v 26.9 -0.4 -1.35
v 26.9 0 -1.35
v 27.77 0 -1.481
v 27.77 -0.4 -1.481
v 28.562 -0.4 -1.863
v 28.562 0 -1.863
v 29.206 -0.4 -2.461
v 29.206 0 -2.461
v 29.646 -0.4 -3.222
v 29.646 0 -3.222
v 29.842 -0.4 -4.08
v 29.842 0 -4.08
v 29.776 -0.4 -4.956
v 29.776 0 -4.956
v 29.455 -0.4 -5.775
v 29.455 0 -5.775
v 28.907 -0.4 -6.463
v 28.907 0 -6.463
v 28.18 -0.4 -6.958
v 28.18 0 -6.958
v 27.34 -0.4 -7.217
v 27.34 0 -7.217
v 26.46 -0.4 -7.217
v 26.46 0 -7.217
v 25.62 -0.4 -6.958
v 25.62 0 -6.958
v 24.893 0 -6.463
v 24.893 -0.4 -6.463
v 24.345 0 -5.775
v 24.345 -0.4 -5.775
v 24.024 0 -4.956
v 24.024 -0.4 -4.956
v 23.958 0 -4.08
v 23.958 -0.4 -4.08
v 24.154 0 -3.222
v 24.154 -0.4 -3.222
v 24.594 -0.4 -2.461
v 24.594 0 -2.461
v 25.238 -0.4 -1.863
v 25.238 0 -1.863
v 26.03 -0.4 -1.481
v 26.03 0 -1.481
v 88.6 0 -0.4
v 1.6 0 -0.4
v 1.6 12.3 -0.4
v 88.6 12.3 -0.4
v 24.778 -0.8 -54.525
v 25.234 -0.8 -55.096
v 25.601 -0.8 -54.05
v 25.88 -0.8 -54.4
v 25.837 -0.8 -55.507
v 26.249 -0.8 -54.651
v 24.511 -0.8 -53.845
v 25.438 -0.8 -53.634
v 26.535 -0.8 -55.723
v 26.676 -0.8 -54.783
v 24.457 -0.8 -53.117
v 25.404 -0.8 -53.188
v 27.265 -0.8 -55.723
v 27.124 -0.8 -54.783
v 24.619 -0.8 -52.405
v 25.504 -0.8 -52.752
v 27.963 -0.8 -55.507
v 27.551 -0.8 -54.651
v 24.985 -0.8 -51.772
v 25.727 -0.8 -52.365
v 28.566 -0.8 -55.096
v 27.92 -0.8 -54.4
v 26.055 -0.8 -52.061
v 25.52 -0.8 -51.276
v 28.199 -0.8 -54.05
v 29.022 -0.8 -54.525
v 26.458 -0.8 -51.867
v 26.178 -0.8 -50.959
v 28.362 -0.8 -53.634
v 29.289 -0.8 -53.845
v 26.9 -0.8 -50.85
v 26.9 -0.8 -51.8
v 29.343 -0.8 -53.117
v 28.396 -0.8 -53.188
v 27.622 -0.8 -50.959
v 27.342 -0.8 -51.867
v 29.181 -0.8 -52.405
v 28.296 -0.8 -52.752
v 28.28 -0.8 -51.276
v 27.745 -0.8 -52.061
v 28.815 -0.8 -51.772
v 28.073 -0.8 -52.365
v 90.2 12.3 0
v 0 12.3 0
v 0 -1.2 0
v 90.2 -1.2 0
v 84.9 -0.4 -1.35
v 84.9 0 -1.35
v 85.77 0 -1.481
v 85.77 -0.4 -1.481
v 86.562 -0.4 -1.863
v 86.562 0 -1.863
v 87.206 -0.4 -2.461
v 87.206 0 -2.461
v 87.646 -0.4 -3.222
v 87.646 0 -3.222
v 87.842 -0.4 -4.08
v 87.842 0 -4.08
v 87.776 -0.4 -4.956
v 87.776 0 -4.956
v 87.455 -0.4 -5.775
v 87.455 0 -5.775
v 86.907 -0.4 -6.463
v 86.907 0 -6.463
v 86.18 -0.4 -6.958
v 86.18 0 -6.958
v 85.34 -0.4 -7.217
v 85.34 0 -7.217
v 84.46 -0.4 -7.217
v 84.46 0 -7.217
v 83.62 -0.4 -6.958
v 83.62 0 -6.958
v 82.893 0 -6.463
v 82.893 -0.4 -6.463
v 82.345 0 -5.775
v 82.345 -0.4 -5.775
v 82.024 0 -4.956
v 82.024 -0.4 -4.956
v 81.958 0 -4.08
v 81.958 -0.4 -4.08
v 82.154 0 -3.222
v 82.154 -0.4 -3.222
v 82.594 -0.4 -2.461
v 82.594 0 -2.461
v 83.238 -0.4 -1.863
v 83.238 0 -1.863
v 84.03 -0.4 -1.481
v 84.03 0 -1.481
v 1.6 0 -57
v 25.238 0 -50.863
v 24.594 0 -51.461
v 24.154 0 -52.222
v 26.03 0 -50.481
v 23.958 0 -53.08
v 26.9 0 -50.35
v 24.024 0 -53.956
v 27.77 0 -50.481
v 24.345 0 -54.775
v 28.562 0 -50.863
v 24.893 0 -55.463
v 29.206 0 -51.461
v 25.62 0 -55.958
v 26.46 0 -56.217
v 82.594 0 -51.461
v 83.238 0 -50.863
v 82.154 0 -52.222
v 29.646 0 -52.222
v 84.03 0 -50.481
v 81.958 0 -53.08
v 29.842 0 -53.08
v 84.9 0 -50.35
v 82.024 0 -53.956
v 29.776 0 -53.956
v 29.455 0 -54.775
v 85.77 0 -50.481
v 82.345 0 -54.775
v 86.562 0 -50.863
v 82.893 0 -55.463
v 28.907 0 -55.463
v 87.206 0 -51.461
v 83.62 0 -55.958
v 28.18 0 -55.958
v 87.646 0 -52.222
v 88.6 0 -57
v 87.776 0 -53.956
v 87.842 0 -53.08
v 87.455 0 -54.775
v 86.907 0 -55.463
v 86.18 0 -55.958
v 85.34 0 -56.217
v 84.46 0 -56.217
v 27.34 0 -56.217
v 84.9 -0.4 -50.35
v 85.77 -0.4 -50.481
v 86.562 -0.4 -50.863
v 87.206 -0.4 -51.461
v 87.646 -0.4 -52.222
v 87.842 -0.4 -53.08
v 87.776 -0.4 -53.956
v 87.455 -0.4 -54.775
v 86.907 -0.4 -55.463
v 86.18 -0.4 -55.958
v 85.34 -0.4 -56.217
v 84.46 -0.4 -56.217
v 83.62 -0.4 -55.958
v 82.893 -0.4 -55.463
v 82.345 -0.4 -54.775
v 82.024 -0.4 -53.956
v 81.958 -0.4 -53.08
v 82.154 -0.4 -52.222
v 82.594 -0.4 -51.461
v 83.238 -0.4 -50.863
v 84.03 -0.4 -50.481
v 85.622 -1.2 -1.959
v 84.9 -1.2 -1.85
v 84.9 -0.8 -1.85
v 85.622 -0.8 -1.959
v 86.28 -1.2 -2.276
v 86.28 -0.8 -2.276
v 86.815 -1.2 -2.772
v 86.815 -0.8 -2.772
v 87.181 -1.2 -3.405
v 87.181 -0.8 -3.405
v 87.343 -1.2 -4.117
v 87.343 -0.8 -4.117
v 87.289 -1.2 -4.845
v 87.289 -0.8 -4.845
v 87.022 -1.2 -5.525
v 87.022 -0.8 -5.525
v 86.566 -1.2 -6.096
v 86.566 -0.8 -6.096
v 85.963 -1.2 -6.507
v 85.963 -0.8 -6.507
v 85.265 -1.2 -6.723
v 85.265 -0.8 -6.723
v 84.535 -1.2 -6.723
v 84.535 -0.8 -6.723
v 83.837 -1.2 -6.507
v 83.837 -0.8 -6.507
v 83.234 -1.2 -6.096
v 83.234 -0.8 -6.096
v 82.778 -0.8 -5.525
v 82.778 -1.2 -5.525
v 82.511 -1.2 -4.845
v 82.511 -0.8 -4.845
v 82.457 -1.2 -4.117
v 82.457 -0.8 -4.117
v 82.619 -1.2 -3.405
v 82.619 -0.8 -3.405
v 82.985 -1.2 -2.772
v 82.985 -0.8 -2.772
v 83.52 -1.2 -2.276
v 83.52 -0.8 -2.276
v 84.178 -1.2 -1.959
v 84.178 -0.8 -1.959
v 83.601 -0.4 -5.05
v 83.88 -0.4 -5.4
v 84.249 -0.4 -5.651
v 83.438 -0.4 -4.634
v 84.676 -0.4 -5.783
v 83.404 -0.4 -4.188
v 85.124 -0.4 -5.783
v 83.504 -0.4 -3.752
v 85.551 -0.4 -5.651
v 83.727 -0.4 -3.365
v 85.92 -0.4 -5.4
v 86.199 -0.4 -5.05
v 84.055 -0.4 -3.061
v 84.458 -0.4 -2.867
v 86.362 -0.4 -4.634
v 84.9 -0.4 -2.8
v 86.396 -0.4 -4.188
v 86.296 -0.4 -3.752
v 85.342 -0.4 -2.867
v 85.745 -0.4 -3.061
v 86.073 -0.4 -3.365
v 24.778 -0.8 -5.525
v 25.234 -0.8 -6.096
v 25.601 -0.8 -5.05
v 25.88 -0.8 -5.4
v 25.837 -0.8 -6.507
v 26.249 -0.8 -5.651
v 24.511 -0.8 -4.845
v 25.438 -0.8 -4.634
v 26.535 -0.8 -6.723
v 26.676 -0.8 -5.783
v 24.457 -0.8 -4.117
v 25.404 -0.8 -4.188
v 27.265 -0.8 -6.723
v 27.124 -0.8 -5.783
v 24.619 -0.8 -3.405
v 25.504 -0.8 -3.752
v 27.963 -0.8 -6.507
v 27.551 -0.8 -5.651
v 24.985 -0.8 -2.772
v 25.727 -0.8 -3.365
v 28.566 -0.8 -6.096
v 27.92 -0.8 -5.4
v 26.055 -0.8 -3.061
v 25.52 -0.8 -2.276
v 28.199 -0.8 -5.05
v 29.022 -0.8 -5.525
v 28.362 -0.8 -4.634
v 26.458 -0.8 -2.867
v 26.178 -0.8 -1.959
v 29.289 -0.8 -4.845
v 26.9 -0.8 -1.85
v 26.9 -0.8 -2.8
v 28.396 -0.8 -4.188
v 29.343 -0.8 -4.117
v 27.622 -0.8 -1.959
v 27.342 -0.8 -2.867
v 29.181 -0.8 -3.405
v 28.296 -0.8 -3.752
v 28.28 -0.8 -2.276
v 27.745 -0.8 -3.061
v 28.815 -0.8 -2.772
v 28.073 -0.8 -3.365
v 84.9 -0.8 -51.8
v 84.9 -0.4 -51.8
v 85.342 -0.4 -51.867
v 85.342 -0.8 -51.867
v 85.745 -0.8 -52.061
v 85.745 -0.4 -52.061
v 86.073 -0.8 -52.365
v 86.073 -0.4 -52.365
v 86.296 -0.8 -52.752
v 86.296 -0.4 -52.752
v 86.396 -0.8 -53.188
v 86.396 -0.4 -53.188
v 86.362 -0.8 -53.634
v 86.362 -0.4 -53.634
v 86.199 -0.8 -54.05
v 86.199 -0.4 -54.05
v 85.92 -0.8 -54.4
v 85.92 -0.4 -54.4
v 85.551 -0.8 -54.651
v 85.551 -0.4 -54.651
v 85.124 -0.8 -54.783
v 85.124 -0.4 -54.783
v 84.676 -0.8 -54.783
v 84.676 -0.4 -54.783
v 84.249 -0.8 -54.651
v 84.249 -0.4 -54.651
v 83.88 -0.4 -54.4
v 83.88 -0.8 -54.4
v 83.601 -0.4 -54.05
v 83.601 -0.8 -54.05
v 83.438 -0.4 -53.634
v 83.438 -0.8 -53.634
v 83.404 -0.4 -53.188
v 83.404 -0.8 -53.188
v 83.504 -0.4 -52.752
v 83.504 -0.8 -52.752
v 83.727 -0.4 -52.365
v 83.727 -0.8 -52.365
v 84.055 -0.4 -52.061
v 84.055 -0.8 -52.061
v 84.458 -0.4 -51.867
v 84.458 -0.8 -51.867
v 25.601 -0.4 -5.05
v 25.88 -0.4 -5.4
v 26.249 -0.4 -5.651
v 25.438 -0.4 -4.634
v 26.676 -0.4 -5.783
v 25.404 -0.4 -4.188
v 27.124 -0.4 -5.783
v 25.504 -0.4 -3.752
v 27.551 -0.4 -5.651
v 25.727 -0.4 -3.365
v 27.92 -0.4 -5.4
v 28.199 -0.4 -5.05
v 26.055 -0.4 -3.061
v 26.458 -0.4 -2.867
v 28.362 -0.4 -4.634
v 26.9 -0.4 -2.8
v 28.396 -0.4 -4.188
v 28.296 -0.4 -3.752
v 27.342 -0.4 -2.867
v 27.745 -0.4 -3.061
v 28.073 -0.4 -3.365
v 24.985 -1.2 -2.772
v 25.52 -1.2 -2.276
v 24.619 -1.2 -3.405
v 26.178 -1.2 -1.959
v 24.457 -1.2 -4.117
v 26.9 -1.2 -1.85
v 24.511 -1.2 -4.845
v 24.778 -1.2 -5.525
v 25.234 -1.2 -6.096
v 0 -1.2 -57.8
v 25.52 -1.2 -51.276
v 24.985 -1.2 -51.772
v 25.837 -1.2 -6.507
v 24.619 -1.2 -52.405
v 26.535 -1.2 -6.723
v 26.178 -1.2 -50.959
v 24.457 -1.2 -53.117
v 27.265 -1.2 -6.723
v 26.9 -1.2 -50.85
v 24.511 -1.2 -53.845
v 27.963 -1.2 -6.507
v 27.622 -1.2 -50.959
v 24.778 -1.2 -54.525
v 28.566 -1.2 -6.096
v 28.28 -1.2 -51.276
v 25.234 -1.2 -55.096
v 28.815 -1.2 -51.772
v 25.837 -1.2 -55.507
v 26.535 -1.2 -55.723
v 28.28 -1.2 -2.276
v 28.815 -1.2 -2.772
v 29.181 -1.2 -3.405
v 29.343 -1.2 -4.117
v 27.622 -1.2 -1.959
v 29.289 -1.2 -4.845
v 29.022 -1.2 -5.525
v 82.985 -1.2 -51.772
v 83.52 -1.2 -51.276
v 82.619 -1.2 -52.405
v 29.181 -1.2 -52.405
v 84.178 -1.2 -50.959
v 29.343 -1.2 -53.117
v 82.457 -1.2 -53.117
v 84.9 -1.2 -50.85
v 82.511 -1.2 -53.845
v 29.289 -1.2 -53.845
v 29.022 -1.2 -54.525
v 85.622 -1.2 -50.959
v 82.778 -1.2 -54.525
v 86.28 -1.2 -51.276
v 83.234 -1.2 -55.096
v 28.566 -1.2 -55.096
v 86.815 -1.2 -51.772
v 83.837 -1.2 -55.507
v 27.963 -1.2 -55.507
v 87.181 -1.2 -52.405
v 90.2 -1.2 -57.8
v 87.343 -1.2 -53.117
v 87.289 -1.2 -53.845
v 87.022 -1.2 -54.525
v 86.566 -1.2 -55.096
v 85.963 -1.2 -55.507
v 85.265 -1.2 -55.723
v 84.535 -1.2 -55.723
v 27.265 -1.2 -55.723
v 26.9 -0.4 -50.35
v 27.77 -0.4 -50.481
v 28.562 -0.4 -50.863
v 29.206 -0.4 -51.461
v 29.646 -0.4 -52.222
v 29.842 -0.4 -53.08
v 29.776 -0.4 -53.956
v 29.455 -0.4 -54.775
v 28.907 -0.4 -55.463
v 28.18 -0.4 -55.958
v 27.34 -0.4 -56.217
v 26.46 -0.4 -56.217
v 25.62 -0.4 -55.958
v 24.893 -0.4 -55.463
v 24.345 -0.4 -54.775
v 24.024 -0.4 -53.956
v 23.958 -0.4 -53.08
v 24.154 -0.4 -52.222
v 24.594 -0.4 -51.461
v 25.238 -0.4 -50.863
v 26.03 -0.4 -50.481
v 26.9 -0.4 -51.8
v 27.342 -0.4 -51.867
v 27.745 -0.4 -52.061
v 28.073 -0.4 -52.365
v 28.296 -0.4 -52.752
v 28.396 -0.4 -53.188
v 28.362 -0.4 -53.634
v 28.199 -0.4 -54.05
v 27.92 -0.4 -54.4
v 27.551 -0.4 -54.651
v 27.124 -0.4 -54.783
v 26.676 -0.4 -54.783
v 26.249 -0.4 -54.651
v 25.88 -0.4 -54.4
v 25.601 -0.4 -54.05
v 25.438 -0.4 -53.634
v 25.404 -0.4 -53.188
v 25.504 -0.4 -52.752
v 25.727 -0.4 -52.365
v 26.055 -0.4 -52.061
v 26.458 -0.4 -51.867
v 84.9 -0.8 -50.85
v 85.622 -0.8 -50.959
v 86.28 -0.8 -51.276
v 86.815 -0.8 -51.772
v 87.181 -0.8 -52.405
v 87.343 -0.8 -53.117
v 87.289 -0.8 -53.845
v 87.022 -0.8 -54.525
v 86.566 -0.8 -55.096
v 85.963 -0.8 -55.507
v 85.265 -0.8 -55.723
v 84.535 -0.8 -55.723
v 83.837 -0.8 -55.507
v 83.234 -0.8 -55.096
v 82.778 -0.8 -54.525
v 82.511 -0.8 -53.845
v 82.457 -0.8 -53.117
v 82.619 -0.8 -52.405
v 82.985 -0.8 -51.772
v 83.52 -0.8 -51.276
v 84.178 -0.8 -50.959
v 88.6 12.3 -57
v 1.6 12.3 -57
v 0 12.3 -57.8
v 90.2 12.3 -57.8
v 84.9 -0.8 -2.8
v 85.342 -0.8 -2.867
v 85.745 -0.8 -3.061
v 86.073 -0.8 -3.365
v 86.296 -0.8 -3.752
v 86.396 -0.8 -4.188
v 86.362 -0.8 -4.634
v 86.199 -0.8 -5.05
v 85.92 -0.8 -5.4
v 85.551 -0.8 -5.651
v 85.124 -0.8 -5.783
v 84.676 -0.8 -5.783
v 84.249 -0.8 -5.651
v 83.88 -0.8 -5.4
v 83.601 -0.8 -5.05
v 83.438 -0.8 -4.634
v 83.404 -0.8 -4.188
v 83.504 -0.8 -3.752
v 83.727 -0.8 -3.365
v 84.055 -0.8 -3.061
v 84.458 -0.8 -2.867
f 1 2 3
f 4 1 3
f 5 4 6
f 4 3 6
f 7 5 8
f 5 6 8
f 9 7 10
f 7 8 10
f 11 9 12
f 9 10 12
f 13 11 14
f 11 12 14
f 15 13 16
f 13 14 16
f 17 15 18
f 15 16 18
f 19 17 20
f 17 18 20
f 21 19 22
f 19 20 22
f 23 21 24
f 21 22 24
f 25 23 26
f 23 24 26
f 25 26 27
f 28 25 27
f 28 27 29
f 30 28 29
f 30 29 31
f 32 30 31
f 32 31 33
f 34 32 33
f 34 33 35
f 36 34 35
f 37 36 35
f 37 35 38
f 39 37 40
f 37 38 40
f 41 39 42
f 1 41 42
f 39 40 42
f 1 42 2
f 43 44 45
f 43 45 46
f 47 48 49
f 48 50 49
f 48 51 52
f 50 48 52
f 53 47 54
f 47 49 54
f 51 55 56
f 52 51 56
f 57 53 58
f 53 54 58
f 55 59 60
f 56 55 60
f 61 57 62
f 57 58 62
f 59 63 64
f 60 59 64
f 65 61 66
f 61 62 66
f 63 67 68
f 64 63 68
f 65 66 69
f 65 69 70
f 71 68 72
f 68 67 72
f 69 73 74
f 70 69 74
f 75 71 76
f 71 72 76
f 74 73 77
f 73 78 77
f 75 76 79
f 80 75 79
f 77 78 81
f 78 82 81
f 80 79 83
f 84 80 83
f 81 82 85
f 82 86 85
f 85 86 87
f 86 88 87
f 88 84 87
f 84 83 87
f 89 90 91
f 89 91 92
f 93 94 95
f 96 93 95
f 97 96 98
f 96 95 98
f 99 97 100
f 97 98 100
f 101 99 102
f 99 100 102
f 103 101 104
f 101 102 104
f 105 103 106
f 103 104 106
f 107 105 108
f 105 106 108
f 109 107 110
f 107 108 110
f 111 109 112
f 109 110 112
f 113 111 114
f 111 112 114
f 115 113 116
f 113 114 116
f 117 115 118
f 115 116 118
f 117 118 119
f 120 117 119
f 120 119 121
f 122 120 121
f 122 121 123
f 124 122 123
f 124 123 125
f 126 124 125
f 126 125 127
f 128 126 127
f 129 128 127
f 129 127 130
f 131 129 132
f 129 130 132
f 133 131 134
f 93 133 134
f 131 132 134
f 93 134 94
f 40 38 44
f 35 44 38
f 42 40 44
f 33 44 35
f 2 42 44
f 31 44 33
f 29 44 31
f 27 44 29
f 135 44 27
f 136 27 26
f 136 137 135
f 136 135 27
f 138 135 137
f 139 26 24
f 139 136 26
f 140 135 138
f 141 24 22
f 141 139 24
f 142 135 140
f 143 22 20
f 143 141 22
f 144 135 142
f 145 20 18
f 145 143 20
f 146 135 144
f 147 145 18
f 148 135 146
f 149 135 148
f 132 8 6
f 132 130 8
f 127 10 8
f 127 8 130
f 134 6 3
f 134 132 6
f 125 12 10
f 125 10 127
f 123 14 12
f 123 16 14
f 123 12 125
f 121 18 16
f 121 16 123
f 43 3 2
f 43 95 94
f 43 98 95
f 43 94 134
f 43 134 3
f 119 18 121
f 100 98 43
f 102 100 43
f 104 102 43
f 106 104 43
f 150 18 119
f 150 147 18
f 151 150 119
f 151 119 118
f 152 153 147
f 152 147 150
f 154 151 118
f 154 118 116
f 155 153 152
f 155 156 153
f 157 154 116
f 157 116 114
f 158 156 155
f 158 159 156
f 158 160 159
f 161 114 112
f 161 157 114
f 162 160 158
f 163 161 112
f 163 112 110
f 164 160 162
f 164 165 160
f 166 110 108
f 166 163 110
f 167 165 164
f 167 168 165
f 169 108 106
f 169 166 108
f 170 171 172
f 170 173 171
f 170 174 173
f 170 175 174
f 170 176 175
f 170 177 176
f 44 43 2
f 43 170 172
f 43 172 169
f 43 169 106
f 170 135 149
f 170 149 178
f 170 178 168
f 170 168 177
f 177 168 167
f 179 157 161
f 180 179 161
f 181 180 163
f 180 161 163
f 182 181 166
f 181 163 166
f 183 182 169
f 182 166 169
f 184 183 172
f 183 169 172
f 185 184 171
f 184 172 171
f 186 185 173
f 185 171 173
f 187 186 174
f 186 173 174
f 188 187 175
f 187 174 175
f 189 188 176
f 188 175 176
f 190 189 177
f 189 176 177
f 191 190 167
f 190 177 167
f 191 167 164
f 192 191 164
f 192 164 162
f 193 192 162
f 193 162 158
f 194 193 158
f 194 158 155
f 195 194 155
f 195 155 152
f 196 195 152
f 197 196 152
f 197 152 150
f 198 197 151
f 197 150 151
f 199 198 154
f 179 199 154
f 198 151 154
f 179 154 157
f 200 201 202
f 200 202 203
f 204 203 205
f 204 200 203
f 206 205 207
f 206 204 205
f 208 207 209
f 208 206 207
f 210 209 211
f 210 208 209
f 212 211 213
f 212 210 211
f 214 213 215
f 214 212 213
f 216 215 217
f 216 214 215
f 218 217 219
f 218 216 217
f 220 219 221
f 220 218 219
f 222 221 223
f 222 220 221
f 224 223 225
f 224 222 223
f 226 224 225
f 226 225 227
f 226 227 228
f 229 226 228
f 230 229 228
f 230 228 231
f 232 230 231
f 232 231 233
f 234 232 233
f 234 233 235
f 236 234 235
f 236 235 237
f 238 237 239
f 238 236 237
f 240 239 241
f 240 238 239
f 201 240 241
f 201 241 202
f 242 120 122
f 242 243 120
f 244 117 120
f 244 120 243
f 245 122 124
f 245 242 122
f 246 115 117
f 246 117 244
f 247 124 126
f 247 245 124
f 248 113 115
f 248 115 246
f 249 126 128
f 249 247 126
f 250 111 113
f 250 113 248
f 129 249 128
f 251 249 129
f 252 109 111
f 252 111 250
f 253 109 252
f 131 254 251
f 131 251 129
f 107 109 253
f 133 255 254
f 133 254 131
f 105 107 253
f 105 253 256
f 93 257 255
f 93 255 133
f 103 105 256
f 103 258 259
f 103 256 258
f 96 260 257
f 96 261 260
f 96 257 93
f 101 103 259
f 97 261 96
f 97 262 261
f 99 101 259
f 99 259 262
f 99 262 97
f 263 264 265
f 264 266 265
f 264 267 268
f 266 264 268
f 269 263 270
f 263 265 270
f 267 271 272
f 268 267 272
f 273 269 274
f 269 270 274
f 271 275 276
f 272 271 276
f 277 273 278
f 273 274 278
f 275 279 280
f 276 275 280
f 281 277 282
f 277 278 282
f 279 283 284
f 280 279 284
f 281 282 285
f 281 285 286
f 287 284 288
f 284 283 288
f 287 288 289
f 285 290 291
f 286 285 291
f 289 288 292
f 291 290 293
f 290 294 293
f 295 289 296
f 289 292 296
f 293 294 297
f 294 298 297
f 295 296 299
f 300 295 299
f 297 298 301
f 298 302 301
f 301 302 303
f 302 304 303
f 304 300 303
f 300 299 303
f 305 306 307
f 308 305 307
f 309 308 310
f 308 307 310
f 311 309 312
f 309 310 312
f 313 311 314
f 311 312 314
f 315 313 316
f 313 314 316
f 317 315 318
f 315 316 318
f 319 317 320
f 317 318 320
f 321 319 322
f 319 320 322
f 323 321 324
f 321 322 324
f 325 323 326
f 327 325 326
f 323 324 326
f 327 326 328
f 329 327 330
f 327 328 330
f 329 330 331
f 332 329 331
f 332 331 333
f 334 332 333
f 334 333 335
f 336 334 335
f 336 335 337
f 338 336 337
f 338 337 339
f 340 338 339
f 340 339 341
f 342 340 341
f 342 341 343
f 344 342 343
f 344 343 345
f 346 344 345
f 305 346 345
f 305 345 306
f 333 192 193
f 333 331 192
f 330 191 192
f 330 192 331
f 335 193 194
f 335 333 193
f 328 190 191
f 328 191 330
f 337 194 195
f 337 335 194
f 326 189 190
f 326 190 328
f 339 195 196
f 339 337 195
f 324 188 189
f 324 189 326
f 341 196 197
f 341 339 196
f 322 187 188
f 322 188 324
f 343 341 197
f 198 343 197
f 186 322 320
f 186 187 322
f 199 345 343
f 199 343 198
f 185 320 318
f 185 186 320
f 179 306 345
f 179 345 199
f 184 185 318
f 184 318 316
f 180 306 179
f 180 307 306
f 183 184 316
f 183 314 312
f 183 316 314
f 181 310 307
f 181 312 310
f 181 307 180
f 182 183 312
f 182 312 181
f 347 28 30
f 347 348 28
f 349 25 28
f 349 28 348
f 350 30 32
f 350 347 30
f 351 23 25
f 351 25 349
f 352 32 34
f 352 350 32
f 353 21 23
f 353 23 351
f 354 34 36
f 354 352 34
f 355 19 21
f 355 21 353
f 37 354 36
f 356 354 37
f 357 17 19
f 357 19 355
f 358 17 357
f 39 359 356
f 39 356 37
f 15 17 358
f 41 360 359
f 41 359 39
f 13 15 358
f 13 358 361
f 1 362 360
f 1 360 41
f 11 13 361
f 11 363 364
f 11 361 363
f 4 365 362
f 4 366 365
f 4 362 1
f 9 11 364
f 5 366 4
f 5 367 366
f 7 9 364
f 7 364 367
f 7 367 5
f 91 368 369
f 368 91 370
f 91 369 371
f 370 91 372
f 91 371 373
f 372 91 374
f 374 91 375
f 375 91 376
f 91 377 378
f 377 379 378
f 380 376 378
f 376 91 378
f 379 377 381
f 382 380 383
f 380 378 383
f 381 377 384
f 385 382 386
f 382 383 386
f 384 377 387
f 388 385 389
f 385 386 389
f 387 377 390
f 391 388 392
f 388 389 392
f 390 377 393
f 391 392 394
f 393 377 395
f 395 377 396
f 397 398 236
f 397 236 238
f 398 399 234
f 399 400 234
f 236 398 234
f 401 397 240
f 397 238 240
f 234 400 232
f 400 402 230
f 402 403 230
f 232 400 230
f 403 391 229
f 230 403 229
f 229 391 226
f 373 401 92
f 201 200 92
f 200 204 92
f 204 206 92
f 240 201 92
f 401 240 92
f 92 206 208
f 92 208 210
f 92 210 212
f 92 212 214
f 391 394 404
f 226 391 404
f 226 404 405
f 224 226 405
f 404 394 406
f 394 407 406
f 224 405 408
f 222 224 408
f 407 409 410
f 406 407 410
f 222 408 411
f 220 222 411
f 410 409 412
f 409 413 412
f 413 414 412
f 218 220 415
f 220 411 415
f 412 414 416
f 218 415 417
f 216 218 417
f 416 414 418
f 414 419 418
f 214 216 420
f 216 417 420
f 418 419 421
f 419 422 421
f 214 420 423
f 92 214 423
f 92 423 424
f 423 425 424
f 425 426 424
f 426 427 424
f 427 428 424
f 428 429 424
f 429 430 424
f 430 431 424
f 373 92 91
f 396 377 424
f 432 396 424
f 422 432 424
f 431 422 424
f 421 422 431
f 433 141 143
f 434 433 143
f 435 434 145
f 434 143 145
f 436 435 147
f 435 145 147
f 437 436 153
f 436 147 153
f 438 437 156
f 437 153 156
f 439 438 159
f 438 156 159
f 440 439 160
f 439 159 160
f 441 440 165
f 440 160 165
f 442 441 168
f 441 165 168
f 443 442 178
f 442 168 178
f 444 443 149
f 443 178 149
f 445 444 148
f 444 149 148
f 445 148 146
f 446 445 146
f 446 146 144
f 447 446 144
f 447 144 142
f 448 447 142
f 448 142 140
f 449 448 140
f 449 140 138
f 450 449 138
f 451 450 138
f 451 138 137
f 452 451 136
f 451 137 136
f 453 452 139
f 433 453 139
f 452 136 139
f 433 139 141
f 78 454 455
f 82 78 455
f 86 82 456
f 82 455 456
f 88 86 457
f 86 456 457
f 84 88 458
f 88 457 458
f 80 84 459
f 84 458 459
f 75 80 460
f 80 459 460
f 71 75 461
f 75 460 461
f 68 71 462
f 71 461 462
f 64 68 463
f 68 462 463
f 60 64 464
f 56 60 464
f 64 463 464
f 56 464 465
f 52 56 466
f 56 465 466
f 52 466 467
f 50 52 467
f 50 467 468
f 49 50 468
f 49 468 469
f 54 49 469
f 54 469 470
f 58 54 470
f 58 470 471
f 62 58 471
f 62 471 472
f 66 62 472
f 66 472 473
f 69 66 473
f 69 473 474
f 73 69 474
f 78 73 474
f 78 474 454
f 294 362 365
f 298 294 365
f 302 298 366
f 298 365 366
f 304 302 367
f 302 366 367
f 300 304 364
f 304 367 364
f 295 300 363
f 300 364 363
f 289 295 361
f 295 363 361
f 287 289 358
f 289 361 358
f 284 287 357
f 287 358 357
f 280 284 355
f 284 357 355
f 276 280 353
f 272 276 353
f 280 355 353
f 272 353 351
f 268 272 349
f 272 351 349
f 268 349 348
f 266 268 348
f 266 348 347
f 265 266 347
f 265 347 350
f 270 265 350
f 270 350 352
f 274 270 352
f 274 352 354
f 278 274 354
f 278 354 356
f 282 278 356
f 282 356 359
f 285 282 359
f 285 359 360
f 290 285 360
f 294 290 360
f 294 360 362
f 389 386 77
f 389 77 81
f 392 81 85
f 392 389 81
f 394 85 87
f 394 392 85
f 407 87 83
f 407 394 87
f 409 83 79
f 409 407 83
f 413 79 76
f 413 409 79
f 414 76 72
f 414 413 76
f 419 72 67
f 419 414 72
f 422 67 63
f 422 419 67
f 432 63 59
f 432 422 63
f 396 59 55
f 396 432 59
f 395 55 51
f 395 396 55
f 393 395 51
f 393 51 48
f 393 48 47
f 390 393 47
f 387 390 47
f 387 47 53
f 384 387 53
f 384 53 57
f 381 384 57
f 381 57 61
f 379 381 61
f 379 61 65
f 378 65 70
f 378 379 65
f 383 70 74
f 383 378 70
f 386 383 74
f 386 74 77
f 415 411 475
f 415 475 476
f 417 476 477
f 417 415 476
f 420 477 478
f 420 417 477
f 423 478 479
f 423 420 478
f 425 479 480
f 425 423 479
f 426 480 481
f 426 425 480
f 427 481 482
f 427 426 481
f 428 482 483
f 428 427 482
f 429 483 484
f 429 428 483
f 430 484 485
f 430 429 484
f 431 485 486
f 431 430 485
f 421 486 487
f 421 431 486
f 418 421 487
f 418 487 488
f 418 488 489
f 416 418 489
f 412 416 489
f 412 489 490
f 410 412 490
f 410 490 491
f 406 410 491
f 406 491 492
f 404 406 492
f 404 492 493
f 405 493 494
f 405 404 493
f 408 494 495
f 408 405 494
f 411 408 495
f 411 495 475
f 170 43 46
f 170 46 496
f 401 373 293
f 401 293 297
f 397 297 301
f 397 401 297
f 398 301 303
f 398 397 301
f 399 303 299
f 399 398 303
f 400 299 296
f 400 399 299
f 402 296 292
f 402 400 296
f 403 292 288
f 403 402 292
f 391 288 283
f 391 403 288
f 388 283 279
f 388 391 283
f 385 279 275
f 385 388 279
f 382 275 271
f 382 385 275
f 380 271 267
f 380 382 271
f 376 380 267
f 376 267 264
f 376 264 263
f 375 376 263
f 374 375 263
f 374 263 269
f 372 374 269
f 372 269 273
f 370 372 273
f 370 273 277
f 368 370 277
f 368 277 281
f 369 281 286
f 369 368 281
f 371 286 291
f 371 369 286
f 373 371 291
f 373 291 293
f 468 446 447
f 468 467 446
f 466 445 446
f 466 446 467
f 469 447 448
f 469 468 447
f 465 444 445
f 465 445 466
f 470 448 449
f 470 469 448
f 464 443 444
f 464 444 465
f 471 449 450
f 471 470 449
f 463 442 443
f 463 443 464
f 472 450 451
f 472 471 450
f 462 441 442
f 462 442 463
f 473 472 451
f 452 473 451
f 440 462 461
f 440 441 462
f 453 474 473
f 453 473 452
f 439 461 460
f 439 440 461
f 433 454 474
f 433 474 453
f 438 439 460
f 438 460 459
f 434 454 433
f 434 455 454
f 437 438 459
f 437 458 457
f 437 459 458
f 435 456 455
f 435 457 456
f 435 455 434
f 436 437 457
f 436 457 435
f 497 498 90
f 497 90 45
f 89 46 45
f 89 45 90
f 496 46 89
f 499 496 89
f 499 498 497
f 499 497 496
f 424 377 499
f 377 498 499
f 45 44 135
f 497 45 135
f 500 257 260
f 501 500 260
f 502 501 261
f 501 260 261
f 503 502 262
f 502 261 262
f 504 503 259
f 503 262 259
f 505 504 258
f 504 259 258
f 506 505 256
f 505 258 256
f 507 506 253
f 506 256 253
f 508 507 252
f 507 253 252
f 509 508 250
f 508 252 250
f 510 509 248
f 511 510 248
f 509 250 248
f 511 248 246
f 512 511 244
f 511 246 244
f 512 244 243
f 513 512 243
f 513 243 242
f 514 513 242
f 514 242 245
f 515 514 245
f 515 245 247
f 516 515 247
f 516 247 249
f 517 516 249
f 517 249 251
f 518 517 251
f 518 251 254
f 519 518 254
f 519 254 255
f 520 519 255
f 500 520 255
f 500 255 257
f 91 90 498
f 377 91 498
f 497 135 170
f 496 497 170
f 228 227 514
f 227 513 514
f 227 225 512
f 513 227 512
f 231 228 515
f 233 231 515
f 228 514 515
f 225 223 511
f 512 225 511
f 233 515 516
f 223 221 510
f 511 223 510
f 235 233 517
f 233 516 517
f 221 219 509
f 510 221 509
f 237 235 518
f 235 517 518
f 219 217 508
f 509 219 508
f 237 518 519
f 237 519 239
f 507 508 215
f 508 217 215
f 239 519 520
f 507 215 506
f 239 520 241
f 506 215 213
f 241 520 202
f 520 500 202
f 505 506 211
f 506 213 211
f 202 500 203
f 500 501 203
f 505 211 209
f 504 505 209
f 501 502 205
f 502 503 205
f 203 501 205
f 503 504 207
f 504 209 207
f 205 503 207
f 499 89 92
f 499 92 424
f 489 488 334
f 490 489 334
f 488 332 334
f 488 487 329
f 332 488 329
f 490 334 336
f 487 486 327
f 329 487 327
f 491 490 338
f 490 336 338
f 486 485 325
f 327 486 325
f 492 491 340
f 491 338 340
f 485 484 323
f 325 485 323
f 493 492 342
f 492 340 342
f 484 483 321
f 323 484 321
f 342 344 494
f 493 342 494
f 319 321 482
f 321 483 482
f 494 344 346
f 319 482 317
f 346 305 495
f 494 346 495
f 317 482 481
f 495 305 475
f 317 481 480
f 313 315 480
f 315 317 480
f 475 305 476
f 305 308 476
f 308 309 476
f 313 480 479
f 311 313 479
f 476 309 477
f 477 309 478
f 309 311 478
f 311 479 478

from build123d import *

# Parameters (mm, degrees)
SKIZZE1_W                       = 90.2
SKIZZE1_H                       = 57.8
SKIZZE1_W_2                     = 87
SKIZZE1_H_2                     = 56.6
AUFSATZ_LINEAR_AUSTRAGEN1_DEPTH = 12.3
SKIZZE2_W                       = 90.2
SKIZZE2_H                       = 57.8
AUFSATZ_LINEAR_AUSTRAGEN2_DEPTH = 1.2
SKIZZE3_R                       = 1.5
SCHNITT_LINEAR_AUSTRAGEN1_DEPTH = 1.2
SKIZZE4_R                       = 2.45
SCHNITT_LINEAR_AUSTRAGEN2_DEPTH = 0.4
SKIZZE5_R                       = 2.95
SCHNITT_LINEAR_AUSTRAGEN3_DEPTH = 0.4


with BuildPart() as part:
    # Skizze1 → Aufsatz-Linear austragen1 (new body)
    with BuildSketch(Plane(origin=(0, 0, 0), x_dir=(1, 0, 0), z_dir=(0, 1, 0))):
        with Locations((45.1, 28.9)):
            Rectangle(SKIZZE1_W, SKIZZE1_H)
        with Locations((45.1, 28.7)):
            Rectangle(SKIZZE1_W_2, SKIZZE1_H_2, mode=Mode.SUBTRACT)
    extrude(amount=AUFSATZ_LINEAR_AUSTRAGEN1_DEPTH)

    # Skizze2 → Aufsatz-Linear austragen2 (add)
    with BuildSketch(Plane(origin=(0, 0, 0), x_dir=(1, 0, 0), z_dir=(0, 1, 0))):
        with Locations((45.1, 28.9)):
            Rectangle(SKIZZE2_W, SKIZZE2_H)
    extrude(amount=-AUFSATZ_LINEAR_AUSTRAGEN2_DEPTH)

    # Skizze3 → Schnitt-Linear austragen1 (cut)
    with BuildSketch(Plane(origin=(0, 0, 0), x_dir=(1, 0, 0), z_dir=(0, 1, 0))):
        with Locations(Location((84.9, 53.3, 0), (0, 0, 270))):
            Circle(SKIZZE3_R)
        with Locations(Location((26.9, 53.3, 0), (0, 0, 270))):
            Circle(SKIZZE3_R)
        with Locations(Location((84.9, 4.3, 0), (0, 0, 270))):
            Circle(SKIZZE3_R)
        with Locations(Location((26.9, 4.3, 0), (0, 0, 270))):
            Circle(SKIZZE3_R)
    extrude(amount=-SCHNITT_LINEAR_AUSTRAGEN1_DEPTH, mode=Mode.SUBTRACT)

    # Skizze4 → Schnitt-Linear austragen2 (cut)
    with BuildSketch(Plane(origin=(0, -1.2, 0), x_dir=(1, 0, 0), z_dir=(0, 1, 0))):
        with Locations(Location((84.9, 53.3, 0), (0, 0, 270))):
            Circle(SKIZZE4_R)
        with Locations(Location((26.9, 53.3, 0), (0, 0, 270))):
            Circle(SKIZZE4_R)
        with Locations(Location((84.9, 4.3, 0), (0, 0, 270))):
            Circle(SKIZZE4_R)
        with Locations(Location((26.9, 4.3, 0), (0, 0, 270))):
            Circle(SKIZZE4_R)
    extrude(amount=SCHNITT_LINEAR_AUSTRAGEN2_DEPTH, mode=Mode.SUBTRACT)

    # Skizze5 → Schnitt-Linear austragen3 (cut)
    with BuildSketch(Plane(origin=(0, 0, 0), x_dir=(1, 0, 0), z_dir=(0, 1, 0))):
        with Locations(Location((84.9, 53.3, 0), (0, 0, 270))):
            Circle(SKIZZE5_R)
        with Locations(Location((26.9, 53.3, 0), (0, 0, 270))):
            Circle(SKIZZE5_R)
        with Locations(Location((84.9, 4.3, 0), (0, 0, 270))):
            Circle(SKIZZE5_R)
        with Locations(Location((26.9, 4.3, 0), (0, 0, 270))):
            Circle(SKIZZE5_R)
    extrude(amount=-SCHNITT_LINEAR_AUSTRAGEN3_DEPTH, mode=Mode.SUBTRACT)


solid = part.part
